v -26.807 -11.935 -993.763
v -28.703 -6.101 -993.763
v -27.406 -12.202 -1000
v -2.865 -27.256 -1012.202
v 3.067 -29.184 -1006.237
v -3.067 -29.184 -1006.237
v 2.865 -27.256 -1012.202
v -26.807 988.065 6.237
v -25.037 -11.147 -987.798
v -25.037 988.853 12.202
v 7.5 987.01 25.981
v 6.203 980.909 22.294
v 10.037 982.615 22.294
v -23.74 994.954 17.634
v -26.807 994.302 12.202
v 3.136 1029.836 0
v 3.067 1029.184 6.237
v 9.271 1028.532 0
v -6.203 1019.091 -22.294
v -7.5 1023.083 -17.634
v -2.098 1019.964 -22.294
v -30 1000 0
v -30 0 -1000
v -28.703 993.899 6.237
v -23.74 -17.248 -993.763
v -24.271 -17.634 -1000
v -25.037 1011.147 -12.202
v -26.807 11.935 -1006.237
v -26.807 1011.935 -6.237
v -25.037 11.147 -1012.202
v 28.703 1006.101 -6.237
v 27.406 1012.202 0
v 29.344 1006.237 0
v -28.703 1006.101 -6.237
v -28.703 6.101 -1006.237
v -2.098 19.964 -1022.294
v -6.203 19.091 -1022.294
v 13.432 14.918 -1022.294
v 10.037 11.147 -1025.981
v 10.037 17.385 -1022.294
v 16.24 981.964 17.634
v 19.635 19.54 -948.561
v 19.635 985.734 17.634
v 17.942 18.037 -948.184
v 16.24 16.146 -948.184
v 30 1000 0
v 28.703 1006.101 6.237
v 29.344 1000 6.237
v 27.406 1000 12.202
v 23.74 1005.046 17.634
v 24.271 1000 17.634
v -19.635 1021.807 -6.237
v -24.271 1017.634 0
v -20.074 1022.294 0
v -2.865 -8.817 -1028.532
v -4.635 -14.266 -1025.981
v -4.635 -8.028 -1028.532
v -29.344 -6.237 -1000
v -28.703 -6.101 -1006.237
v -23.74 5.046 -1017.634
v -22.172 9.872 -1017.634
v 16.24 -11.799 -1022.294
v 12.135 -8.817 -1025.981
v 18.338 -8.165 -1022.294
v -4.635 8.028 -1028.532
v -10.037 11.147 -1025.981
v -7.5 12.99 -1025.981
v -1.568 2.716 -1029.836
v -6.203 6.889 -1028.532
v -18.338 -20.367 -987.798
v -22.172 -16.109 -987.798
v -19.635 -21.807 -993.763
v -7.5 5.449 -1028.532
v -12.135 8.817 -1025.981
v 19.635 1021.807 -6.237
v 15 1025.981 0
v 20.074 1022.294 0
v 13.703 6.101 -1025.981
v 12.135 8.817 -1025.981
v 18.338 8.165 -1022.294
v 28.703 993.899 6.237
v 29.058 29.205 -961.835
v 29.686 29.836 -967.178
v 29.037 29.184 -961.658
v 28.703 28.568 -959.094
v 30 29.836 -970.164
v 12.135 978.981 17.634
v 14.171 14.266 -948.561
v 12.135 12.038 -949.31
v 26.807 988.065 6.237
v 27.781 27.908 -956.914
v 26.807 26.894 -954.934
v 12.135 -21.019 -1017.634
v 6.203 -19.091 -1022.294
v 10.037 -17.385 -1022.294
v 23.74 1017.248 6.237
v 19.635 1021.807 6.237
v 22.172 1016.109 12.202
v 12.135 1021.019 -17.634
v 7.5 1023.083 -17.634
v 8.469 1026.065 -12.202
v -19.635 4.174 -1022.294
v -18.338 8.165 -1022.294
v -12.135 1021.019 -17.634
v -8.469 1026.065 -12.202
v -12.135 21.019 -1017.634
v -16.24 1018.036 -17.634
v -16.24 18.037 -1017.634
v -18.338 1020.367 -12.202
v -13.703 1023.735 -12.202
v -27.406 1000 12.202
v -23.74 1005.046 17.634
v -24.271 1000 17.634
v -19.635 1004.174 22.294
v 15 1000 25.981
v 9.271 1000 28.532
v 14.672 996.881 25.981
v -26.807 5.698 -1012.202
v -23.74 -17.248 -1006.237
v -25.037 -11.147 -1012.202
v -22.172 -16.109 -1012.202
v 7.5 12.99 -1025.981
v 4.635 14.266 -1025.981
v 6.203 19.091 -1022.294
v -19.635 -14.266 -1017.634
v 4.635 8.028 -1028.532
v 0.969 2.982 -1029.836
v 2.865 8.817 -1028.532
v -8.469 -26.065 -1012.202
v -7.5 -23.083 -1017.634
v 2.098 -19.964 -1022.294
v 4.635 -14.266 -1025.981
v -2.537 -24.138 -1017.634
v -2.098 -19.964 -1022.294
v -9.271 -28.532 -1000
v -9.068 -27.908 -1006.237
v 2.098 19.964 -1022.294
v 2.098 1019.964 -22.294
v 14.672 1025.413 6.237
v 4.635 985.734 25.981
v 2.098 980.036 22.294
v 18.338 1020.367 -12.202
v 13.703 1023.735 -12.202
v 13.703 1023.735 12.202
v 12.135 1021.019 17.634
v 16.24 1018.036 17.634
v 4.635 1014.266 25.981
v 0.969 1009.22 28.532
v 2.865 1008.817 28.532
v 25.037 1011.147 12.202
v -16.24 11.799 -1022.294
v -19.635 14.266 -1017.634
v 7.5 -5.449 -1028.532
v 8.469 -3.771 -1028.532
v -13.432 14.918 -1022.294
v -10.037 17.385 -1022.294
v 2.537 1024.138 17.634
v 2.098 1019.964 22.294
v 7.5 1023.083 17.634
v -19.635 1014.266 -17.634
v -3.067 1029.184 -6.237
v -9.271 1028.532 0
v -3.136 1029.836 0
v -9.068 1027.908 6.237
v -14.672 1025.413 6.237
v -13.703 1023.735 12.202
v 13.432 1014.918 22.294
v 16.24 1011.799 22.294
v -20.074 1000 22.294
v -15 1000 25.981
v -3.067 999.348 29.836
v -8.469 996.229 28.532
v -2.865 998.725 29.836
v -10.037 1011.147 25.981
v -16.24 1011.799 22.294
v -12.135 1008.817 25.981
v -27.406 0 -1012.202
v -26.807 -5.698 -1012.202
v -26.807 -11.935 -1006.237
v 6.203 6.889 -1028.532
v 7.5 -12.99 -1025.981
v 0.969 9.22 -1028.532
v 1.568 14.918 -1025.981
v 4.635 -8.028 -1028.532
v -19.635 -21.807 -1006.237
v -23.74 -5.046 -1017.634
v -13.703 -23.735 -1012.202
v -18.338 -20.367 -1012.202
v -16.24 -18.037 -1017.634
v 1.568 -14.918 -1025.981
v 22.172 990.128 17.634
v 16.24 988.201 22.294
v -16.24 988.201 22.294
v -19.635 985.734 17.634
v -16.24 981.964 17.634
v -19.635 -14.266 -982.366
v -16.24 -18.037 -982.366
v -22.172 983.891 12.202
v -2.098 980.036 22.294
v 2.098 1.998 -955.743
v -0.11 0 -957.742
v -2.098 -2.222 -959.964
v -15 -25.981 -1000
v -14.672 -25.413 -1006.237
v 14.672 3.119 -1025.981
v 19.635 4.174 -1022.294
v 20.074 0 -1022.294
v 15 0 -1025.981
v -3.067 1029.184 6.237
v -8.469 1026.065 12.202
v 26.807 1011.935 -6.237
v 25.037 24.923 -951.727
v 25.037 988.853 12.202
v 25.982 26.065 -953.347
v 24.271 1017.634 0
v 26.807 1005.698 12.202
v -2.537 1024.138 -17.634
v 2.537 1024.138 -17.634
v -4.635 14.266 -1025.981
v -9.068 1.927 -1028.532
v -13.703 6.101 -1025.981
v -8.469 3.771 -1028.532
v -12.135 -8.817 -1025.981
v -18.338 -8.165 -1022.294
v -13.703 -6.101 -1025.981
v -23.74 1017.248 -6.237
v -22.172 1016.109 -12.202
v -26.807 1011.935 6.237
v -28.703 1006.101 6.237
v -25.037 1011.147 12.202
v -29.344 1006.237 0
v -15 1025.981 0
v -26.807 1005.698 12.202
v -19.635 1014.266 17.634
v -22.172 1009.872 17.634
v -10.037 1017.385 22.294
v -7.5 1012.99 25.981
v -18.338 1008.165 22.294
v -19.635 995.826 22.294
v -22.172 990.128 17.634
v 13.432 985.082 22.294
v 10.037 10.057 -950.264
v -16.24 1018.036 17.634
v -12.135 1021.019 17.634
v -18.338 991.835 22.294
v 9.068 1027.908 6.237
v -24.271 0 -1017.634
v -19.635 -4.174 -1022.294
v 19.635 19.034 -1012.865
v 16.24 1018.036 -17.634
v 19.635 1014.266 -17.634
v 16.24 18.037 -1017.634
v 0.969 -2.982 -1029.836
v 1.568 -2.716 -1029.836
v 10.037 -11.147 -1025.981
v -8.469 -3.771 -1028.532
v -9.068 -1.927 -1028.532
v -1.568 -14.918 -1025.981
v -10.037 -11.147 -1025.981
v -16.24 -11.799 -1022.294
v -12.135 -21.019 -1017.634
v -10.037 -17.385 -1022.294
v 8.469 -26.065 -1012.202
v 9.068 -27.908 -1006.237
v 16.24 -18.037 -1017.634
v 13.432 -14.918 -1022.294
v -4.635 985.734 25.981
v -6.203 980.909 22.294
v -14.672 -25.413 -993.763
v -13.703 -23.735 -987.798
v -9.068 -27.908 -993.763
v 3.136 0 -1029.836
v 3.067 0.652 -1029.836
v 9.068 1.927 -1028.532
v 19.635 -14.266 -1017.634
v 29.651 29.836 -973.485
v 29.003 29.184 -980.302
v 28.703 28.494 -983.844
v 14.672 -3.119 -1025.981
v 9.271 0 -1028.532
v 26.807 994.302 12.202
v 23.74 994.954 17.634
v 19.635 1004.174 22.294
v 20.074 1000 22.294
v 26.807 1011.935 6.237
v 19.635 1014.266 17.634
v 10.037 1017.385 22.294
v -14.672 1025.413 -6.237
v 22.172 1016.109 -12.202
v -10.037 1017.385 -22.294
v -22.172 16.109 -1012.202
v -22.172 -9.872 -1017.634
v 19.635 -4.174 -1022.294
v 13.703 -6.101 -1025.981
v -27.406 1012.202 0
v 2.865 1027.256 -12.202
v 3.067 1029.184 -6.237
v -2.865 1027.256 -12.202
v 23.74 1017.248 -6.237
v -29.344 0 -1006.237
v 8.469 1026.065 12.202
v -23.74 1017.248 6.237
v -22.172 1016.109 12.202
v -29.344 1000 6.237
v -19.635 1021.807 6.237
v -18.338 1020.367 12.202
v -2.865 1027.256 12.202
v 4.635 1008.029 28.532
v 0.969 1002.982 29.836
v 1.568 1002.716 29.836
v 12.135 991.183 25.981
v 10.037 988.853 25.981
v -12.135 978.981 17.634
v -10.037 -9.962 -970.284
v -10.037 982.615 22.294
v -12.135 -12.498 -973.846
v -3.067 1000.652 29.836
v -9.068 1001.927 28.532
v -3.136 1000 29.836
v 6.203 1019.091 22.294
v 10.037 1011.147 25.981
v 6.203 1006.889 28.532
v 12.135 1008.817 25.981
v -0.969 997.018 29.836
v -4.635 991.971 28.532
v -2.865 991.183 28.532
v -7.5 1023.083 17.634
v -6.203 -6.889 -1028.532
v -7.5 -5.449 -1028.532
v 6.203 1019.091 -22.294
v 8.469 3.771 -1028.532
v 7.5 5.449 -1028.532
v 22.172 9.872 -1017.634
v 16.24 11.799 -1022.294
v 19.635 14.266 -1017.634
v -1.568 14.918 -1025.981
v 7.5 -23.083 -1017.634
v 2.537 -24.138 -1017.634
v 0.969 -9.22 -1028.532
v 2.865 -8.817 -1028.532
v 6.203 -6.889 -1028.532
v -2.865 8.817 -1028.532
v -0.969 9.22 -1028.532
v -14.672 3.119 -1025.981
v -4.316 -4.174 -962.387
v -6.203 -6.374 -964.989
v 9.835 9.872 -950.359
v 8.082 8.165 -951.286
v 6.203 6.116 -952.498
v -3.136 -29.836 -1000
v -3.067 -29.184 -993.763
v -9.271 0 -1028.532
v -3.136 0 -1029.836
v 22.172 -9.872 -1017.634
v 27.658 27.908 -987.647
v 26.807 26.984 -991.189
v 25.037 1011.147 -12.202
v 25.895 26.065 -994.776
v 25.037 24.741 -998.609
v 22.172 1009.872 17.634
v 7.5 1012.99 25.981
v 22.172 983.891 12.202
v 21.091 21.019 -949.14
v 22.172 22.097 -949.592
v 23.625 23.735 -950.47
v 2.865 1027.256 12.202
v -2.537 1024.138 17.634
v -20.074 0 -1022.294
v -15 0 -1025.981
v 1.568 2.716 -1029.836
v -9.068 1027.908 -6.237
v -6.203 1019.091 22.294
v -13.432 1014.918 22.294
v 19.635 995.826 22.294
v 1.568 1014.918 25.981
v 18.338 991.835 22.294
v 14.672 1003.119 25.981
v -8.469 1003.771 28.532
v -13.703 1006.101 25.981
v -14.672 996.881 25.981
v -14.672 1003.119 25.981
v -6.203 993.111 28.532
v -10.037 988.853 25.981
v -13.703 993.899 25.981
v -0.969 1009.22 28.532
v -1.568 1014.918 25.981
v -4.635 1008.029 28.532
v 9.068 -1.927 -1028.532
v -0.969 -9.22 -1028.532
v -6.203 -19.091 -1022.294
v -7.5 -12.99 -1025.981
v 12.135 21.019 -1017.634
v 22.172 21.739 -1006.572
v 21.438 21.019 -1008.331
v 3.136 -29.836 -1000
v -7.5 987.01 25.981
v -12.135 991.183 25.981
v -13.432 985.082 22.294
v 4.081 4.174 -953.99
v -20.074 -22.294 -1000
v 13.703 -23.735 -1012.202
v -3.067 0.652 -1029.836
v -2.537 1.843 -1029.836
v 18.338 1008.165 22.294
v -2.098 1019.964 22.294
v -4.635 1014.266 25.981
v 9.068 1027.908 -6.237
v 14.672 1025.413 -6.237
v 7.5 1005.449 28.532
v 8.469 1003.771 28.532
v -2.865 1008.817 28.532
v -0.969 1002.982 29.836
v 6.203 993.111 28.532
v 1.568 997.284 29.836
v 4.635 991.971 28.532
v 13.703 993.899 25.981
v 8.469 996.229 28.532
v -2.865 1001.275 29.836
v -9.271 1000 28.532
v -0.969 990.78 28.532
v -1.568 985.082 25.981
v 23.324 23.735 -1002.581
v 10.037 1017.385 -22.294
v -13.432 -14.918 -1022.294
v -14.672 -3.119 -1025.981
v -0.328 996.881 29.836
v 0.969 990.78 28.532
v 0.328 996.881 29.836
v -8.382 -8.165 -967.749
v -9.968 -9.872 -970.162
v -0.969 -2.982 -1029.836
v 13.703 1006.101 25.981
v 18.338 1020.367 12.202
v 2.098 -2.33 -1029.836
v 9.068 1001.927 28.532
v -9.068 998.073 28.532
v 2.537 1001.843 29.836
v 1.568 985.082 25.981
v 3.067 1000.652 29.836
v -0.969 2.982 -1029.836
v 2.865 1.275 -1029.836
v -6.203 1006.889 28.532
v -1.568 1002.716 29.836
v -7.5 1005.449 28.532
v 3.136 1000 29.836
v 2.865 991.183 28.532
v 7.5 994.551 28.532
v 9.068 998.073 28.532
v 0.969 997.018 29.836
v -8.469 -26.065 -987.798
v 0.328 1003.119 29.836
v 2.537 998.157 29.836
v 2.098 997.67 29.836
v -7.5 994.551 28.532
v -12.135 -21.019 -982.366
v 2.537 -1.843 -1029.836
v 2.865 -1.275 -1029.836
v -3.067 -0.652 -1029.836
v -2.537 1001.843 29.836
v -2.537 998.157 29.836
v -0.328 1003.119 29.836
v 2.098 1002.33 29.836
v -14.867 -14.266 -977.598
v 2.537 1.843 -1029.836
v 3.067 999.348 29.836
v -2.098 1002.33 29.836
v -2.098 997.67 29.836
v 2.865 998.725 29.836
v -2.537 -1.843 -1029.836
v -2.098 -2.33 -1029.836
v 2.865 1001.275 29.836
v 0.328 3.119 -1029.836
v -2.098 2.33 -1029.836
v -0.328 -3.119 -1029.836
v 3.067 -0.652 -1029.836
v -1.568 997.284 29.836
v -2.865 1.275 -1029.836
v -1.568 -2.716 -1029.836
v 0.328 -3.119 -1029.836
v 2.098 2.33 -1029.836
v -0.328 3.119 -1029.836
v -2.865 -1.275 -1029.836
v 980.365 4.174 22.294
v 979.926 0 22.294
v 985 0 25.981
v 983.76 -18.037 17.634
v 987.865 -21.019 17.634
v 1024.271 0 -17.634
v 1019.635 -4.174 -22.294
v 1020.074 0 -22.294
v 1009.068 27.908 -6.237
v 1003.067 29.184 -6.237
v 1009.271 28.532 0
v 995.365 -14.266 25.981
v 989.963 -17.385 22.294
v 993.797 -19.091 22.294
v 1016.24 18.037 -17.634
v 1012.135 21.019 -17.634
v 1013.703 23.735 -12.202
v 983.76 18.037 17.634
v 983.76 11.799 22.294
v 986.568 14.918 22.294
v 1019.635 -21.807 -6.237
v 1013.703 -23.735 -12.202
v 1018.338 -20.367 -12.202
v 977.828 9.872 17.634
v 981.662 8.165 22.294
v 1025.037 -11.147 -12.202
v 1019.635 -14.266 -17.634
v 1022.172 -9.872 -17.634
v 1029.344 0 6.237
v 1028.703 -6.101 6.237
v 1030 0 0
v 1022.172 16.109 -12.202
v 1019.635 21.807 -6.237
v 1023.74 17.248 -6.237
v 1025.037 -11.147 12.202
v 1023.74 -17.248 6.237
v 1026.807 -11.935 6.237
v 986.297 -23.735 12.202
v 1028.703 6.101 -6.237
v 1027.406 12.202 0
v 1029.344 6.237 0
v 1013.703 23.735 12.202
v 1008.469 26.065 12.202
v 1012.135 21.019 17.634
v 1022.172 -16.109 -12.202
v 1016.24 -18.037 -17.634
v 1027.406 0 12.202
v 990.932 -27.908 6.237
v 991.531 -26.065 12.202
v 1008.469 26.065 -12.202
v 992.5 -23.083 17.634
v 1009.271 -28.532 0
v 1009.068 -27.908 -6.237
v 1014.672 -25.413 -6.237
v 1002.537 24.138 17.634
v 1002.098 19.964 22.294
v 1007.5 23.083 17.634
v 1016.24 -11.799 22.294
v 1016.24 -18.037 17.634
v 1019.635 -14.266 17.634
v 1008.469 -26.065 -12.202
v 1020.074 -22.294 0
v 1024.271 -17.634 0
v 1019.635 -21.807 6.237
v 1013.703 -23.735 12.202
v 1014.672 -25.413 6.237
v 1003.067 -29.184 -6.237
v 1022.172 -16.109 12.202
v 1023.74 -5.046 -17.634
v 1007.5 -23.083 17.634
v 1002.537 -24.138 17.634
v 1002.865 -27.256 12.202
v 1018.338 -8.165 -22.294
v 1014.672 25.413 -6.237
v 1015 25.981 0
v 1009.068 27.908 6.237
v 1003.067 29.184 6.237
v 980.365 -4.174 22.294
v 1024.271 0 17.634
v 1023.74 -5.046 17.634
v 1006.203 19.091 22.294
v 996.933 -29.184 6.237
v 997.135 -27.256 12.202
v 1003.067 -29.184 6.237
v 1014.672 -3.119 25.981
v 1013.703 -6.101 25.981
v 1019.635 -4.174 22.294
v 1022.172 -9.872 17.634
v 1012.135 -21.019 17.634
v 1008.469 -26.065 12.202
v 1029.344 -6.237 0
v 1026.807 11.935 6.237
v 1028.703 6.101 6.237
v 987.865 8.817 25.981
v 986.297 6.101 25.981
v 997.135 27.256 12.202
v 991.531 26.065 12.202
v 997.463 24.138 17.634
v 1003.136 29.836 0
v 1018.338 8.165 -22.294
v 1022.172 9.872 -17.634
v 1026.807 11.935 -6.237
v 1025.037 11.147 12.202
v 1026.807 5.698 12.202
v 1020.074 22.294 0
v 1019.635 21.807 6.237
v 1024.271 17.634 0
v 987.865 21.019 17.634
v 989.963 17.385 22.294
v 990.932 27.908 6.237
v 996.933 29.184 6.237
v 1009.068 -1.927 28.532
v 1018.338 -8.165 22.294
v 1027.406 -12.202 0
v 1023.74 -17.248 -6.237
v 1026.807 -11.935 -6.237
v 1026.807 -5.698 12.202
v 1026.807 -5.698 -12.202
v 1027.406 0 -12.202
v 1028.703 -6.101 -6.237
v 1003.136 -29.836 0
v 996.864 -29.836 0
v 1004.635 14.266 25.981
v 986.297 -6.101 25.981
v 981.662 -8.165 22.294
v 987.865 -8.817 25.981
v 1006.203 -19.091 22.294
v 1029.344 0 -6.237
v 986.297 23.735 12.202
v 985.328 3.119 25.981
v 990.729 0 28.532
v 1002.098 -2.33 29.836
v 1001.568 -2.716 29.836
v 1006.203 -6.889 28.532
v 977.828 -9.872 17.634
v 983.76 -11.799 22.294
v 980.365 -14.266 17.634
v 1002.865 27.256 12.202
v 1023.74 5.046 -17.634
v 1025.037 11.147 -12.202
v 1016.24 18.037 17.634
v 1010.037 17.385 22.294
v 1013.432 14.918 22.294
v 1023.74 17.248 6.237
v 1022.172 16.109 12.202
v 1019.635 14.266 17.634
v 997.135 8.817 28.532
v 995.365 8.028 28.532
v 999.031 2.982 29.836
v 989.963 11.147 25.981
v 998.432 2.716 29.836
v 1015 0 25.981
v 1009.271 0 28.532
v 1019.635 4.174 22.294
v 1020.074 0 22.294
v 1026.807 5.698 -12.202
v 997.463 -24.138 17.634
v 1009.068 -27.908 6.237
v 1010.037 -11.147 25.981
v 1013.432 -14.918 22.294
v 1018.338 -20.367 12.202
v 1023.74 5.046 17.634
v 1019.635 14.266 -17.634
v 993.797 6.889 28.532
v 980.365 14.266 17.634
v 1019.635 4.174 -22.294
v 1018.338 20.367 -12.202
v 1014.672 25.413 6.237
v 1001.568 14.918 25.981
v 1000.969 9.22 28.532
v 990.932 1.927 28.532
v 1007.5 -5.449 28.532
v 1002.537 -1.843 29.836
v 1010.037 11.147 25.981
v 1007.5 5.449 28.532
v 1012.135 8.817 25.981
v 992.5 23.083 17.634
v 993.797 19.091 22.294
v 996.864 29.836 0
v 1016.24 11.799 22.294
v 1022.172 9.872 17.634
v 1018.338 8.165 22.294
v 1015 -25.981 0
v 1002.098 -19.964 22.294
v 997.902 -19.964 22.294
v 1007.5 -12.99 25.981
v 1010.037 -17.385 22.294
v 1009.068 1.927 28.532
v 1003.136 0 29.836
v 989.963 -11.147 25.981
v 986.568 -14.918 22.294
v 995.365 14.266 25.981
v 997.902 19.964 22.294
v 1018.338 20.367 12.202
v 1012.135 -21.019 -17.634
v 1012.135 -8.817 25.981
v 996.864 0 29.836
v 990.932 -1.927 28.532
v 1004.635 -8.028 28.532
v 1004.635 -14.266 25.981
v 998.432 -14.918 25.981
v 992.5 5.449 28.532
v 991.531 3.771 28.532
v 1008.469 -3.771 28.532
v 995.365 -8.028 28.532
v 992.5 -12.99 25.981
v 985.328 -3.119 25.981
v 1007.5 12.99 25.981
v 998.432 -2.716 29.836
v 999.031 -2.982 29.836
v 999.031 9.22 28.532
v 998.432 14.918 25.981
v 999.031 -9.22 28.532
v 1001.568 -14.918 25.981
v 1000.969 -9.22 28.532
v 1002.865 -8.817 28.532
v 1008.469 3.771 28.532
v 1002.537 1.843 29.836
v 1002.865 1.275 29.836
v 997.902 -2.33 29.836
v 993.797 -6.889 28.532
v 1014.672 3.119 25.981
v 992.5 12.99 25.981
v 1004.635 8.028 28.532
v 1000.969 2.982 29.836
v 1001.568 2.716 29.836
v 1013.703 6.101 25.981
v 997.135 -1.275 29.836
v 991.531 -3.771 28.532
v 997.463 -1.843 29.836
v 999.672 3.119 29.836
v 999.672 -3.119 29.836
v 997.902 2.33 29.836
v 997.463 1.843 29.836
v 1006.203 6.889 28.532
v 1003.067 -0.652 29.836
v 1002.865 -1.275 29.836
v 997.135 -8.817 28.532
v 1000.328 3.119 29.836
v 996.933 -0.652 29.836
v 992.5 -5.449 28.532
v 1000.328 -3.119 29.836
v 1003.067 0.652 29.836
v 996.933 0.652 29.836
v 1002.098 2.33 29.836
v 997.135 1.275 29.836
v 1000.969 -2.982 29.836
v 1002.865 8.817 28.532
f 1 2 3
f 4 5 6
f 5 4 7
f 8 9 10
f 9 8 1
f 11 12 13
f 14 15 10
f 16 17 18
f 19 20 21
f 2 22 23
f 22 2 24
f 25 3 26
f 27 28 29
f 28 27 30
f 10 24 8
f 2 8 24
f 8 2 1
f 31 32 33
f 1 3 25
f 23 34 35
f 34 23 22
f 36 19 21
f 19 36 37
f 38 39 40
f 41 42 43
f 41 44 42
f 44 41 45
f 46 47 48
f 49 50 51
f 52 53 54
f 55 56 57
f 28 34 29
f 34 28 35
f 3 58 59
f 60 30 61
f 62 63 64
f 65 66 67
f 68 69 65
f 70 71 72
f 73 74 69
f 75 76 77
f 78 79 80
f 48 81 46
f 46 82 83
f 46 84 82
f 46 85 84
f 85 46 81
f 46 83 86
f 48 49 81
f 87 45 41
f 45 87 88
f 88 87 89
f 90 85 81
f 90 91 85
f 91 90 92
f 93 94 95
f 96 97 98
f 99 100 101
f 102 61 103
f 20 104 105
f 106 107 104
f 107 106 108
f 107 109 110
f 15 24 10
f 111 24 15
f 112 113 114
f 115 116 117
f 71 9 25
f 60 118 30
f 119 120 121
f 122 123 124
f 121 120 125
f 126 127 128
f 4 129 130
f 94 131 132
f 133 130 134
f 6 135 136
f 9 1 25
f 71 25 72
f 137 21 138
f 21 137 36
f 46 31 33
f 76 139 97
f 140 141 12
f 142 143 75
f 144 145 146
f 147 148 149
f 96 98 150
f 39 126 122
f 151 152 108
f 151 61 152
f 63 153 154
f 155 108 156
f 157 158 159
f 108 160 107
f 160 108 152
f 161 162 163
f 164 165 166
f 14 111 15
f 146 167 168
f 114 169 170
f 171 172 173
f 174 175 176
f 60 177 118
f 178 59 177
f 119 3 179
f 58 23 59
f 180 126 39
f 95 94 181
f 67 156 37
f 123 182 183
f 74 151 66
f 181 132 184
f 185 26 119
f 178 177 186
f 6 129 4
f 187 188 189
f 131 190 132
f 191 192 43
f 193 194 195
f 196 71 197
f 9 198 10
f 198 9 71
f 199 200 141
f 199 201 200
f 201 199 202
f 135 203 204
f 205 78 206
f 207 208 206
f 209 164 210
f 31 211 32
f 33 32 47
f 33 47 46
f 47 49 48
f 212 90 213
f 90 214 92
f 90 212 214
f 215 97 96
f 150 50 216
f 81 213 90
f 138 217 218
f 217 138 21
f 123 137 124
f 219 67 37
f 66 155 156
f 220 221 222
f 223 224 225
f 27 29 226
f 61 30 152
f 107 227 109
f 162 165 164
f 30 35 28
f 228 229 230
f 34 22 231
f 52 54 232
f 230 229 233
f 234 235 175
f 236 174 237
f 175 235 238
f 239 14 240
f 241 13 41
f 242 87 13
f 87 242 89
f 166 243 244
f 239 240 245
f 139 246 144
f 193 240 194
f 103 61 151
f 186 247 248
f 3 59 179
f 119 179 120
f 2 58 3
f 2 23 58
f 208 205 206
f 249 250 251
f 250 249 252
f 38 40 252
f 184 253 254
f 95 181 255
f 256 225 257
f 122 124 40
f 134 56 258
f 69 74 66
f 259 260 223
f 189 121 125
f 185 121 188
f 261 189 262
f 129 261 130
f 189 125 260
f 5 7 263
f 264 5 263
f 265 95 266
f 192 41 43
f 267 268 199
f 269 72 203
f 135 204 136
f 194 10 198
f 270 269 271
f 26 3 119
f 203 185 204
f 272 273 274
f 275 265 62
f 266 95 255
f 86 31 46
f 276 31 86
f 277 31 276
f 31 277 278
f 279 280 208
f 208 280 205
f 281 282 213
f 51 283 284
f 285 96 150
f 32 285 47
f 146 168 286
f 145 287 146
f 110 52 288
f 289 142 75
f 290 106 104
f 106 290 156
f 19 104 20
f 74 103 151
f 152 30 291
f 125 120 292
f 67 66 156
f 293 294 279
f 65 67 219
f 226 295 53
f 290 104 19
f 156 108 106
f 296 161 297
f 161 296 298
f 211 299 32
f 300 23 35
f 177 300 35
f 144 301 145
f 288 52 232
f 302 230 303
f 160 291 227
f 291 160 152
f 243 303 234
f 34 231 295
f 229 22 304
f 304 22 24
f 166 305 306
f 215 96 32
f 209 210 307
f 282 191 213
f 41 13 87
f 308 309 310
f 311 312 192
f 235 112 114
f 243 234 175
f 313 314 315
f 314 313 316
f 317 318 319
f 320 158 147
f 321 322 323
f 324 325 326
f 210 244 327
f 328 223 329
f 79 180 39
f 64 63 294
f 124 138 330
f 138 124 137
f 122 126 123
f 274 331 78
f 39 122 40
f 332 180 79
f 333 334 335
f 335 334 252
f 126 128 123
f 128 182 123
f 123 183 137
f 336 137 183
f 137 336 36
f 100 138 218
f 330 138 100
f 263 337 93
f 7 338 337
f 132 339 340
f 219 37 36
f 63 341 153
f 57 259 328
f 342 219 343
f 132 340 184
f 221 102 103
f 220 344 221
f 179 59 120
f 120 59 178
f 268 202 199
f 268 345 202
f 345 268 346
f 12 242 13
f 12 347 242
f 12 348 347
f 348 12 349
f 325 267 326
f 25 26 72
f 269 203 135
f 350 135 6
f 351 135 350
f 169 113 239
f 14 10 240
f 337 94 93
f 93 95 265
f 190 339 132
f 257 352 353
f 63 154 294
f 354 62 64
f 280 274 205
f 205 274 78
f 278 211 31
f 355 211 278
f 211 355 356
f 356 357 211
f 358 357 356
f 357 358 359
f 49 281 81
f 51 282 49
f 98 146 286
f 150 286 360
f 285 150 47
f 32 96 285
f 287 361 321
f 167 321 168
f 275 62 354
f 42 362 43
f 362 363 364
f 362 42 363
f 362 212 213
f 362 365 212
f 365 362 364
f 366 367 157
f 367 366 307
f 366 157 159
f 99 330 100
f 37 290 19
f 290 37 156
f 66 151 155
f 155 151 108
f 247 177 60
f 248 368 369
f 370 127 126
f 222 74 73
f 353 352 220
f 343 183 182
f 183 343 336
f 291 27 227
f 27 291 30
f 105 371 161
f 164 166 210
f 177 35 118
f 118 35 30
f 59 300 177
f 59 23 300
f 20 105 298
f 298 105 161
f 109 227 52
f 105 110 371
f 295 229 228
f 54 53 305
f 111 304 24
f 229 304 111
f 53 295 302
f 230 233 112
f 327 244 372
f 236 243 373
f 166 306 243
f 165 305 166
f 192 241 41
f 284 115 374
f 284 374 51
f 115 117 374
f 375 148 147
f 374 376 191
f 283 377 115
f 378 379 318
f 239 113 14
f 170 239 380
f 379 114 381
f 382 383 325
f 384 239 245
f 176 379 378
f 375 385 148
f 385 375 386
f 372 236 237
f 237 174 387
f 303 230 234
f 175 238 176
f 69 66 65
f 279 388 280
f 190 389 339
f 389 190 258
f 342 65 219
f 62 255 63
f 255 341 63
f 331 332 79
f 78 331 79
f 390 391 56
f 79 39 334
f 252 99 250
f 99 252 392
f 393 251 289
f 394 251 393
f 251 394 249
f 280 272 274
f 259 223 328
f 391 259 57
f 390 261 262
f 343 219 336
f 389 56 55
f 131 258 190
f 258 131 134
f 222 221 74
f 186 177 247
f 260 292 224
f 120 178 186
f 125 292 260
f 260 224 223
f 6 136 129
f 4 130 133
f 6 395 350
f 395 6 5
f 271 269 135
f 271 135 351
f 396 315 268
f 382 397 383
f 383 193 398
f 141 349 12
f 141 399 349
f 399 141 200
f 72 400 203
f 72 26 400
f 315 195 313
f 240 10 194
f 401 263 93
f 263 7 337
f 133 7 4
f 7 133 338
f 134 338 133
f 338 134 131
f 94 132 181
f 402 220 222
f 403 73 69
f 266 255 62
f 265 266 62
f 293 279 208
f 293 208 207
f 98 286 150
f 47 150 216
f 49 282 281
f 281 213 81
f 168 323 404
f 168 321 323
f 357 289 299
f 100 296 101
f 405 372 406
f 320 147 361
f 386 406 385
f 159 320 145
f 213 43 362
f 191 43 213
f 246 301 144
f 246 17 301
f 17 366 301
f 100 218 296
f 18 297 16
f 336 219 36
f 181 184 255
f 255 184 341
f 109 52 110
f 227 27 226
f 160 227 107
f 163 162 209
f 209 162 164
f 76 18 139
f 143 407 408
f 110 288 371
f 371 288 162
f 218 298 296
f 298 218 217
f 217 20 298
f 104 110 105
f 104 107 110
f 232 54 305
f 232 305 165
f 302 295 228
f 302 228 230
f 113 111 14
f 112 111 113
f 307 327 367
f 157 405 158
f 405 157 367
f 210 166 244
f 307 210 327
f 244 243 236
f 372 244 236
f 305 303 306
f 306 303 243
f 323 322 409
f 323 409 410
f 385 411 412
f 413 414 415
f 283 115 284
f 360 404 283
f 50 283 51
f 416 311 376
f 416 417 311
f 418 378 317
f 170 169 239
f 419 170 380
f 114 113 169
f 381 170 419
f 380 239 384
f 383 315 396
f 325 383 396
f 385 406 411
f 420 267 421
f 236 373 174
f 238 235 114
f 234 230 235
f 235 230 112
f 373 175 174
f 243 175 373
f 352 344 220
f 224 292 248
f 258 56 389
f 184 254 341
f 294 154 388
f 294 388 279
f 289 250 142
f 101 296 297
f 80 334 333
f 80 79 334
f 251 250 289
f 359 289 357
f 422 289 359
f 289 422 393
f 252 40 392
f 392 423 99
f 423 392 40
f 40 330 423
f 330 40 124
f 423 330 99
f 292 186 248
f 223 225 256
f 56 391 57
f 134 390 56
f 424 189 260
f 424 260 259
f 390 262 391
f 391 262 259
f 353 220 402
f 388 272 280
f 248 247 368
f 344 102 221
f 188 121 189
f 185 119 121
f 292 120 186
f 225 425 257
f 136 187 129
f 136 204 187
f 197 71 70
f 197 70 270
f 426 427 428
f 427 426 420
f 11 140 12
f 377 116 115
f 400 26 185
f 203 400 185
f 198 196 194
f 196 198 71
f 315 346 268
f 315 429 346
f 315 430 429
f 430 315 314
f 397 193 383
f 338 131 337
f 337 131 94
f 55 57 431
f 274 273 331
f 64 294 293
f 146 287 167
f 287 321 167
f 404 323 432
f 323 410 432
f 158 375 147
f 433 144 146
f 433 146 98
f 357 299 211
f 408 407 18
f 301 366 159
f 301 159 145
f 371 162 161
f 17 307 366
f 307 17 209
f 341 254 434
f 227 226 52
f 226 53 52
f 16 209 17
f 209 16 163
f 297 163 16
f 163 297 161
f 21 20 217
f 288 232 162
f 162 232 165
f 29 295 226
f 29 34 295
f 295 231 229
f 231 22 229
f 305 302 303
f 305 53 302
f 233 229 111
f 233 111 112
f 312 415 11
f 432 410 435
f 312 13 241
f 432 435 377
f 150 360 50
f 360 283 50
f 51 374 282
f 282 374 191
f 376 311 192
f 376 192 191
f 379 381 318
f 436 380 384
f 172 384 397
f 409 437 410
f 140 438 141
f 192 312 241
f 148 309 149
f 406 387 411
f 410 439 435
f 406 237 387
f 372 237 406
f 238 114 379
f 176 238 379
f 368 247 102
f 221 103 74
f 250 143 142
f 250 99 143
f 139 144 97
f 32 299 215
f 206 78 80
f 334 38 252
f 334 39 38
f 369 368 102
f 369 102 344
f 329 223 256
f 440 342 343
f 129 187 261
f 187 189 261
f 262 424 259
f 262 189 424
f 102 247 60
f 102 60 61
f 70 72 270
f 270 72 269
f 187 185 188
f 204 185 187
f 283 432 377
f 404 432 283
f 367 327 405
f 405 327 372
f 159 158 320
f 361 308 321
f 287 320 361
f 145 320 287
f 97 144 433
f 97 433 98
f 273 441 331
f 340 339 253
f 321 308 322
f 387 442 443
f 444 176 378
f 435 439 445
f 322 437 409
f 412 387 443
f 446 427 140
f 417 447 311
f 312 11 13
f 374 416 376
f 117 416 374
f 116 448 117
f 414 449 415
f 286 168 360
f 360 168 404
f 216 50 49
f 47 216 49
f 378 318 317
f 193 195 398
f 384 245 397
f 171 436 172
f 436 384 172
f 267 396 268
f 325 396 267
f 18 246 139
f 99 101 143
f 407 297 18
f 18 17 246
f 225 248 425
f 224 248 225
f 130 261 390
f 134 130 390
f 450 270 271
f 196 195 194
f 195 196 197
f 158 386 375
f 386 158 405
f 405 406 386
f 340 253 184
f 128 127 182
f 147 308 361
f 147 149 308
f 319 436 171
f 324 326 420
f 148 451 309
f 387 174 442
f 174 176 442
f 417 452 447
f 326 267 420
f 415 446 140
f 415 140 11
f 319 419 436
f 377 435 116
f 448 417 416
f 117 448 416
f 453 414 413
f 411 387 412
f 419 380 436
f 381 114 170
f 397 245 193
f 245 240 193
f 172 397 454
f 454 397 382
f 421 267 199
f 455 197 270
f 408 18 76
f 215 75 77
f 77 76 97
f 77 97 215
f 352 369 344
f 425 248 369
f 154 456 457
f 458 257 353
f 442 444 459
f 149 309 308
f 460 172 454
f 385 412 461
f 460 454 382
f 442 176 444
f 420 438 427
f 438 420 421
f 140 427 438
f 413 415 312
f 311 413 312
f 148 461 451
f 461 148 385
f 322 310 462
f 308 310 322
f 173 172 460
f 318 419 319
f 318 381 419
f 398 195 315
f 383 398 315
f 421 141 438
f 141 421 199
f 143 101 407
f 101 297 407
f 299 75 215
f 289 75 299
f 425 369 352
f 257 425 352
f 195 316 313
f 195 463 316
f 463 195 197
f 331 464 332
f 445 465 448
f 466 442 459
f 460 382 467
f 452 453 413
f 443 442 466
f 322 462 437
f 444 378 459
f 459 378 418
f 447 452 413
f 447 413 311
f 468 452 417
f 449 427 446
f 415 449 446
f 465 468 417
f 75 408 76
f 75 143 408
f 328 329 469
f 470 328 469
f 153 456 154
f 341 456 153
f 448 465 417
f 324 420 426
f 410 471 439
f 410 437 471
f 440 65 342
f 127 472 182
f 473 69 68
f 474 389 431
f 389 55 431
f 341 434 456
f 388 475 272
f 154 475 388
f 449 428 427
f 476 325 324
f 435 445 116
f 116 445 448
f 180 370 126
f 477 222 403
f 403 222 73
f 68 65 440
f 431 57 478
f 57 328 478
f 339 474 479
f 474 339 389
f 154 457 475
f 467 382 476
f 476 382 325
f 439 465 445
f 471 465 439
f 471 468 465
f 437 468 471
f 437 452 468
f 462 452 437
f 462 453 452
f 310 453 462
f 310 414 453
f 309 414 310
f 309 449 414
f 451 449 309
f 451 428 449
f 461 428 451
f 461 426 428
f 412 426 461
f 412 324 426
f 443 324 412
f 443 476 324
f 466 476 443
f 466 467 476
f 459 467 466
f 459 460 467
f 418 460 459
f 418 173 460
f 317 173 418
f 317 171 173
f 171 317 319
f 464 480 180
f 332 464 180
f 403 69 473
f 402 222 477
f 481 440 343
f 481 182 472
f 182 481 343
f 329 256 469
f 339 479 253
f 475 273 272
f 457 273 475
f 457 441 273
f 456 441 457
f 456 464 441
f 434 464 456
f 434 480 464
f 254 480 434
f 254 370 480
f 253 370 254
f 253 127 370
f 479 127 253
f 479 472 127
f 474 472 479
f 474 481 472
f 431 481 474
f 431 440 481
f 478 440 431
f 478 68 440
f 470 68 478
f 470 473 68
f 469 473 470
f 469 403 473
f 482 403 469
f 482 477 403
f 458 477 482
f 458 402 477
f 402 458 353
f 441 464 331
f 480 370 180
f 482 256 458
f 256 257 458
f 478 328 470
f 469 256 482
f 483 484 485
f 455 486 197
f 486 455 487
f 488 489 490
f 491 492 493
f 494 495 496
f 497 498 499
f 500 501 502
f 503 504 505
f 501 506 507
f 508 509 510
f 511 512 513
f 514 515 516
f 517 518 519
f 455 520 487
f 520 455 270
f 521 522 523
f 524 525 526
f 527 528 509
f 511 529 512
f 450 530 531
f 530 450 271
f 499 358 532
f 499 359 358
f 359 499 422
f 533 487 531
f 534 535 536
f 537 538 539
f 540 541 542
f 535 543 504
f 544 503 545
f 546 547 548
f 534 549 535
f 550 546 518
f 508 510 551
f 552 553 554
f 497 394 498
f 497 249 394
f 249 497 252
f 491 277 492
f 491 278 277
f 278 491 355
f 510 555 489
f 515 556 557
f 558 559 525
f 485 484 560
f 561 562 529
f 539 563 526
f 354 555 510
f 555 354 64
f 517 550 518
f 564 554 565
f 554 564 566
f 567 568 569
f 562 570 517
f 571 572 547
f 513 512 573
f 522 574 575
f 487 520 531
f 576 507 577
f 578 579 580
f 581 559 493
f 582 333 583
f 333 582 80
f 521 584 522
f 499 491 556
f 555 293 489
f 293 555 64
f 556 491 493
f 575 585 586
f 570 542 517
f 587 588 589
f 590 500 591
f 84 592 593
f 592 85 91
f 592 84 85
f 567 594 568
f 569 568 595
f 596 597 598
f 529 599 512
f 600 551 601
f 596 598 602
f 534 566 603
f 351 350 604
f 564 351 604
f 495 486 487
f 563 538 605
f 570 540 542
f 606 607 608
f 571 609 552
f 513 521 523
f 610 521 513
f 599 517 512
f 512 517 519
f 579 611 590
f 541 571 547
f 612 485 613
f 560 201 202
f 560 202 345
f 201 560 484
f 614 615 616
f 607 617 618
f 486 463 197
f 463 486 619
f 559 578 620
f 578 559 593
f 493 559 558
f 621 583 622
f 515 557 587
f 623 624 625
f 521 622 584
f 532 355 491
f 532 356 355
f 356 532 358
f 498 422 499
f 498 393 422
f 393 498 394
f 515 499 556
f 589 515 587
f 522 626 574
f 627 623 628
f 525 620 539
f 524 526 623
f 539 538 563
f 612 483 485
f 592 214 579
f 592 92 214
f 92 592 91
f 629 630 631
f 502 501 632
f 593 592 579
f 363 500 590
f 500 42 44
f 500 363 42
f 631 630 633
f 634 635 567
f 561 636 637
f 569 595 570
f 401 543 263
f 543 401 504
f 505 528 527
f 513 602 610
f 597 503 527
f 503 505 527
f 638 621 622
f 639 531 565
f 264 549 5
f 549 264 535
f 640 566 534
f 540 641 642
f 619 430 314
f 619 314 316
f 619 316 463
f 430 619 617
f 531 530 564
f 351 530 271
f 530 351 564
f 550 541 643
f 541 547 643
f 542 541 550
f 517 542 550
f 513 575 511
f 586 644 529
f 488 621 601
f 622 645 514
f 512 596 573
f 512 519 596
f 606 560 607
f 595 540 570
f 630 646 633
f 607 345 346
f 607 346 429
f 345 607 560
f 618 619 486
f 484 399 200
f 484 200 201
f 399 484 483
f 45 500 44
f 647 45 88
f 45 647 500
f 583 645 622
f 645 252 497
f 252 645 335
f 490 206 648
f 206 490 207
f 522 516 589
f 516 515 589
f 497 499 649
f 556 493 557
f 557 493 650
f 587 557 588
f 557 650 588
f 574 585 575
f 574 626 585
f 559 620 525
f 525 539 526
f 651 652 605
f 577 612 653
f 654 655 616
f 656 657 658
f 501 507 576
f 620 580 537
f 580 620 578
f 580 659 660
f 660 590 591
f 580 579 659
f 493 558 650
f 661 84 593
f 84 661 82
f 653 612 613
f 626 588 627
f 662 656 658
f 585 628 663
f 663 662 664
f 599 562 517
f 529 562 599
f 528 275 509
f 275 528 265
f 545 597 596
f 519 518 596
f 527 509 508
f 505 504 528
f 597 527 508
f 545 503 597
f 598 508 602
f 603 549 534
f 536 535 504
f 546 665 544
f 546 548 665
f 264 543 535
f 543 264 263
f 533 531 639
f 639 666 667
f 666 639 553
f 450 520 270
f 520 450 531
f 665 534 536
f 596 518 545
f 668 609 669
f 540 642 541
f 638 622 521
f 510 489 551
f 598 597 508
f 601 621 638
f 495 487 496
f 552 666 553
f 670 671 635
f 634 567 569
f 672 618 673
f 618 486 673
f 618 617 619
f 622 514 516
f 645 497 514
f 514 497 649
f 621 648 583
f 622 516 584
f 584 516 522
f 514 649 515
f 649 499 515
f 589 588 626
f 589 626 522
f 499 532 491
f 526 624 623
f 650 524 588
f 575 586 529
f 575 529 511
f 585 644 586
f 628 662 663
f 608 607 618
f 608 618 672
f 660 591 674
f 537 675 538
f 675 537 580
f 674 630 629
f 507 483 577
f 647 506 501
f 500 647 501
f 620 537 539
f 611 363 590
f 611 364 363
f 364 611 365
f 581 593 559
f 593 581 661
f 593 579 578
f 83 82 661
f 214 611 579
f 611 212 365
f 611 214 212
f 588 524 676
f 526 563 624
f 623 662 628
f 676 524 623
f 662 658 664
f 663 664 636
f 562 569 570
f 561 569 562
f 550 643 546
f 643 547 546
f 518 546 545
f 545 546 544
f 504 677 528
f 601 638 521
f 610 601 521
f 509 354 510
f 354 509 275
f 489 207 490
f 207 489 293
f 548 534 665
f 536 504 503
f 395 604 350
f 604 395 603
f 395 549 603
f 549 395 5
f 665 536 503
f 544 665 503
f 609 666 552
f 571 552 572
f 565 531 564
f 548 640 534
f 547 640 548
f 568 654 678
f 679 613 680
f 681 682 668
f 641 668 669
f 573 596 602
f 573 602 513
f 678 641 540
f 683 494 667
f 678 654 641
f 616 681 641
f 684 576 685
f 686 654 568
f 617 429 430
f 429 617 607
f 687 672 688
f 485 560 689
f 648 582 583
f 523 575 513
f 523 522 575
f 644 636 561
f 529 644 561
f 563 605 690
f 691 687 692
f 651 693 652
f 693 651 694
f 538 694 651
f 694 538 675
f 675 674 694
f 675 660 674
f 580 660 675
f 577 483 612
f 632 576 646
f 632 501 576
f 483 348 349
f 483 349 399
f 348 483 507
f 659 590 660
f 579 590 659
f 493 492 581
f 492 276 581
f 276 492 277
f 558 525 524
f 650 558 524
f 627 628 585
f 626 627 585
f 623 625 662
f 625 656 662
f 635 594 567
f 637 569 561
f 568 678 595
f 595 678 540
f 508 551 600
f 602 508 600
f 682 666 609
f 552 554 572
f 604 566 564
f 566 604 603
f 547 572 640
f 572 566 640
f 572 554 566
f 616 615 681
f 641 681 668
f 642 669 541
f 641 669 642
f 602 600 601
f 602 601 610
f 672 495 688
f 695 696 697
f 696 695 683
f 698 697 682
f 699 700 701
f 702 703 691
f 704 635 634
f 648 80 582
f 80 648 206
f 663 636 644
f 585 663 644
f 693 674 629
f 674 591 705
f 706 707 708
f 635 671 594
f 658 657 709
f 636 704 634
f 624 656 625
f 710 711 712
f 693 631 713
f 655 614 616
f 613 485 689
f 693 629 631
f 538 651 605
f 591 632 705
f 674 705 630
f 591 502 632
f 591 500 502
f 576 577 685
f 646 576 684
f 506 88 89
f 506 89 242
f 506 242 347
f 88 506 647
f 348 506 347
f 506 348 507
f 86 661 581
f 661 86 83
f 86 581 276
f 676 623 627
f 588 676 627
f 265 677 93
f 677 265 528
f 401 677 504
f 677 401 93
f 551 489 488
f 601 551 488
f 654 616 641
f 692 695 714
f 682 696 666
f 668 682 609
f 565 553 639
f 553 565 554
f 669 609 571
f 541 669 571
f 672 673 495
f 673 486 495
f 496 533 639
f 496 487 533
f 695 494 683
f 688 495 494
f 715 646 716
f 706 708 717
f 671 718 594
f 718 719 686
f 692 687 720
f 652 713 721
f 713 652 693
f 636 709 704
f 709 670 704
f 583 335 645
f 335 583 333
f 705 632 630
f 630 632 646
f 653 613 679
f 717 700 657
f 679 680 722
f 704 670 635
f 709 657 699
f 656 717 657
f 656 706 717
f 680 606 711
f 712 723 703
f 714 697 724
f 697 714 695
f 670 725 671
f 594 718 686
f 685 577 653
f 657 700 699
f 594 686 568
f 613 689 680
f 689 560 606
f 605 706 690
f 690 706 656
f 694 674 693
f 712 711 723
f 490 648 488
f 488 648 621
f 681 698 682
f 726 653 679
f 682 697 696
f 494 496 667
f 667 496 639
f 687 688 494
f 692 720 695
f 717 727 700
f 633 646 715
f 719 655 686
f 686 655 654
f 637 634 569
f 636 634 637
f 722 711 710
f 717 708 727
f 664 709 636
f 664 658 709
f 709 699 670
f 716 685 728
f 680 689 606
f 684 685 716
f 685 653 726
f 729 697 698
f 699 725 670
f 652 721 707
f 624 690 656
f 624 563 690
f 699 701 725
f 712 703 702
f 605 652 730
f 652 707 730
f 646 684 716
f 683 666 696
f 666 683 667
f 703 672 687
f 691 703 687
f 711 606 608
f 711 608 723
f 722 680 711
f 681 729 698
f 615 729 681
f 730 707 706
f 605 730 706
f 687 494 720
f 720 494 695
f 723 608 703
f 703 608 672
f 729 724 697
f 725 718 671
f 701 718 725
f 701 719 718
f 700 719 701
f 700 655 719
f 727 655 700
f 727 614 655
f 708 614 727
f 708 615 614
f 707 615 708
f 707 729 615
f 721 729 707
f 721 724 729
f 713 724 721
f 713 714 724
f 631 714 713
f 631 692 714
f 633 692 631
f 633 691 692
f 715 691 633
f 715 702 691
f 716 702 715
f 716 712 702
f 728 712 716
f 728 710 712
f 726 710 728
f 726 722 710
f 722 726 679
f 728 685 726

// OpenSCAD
module line(start, end=[0,0,0], thickness = 0.01) {
    hull() {
        translate(start) sphere(thickness);
        translate(end) sphere(thickness);
    }
}



%scale(1000)
polyhedron(
    points = [
        [ 1, 0, 0],
        [-1, 0, 0],
        [ 0, 1, 0],
        [ 0,-1, 0],
        [ 0, 0, 1],
        [ 0, 0,-1],
    ],
    faces = [
        [0, 2, 4],
        [0, 2, 5],
        [0, 3, 4],
        [0, 3, 5],
        [1, 2, 4],
        [1, 2, 5],
        [1, 3, 4],
        [1, 3, 5],
    ]
);

top=[0,0,1]*1e3;
bottom=[0,0,-1]*1e3;
corner_px=[1,0,0]*1e3;
corner_nx=[-1,0,0]*1e3;
corner_py=[0,1,0]*1e3;
corner_ny=[0,-1,0]*1e3;

// line(corner_px, top, 30);
// line(corner_py, top, 30);

line(bottom, corner_py, 30);
line(bottom, corner_px, 30);
